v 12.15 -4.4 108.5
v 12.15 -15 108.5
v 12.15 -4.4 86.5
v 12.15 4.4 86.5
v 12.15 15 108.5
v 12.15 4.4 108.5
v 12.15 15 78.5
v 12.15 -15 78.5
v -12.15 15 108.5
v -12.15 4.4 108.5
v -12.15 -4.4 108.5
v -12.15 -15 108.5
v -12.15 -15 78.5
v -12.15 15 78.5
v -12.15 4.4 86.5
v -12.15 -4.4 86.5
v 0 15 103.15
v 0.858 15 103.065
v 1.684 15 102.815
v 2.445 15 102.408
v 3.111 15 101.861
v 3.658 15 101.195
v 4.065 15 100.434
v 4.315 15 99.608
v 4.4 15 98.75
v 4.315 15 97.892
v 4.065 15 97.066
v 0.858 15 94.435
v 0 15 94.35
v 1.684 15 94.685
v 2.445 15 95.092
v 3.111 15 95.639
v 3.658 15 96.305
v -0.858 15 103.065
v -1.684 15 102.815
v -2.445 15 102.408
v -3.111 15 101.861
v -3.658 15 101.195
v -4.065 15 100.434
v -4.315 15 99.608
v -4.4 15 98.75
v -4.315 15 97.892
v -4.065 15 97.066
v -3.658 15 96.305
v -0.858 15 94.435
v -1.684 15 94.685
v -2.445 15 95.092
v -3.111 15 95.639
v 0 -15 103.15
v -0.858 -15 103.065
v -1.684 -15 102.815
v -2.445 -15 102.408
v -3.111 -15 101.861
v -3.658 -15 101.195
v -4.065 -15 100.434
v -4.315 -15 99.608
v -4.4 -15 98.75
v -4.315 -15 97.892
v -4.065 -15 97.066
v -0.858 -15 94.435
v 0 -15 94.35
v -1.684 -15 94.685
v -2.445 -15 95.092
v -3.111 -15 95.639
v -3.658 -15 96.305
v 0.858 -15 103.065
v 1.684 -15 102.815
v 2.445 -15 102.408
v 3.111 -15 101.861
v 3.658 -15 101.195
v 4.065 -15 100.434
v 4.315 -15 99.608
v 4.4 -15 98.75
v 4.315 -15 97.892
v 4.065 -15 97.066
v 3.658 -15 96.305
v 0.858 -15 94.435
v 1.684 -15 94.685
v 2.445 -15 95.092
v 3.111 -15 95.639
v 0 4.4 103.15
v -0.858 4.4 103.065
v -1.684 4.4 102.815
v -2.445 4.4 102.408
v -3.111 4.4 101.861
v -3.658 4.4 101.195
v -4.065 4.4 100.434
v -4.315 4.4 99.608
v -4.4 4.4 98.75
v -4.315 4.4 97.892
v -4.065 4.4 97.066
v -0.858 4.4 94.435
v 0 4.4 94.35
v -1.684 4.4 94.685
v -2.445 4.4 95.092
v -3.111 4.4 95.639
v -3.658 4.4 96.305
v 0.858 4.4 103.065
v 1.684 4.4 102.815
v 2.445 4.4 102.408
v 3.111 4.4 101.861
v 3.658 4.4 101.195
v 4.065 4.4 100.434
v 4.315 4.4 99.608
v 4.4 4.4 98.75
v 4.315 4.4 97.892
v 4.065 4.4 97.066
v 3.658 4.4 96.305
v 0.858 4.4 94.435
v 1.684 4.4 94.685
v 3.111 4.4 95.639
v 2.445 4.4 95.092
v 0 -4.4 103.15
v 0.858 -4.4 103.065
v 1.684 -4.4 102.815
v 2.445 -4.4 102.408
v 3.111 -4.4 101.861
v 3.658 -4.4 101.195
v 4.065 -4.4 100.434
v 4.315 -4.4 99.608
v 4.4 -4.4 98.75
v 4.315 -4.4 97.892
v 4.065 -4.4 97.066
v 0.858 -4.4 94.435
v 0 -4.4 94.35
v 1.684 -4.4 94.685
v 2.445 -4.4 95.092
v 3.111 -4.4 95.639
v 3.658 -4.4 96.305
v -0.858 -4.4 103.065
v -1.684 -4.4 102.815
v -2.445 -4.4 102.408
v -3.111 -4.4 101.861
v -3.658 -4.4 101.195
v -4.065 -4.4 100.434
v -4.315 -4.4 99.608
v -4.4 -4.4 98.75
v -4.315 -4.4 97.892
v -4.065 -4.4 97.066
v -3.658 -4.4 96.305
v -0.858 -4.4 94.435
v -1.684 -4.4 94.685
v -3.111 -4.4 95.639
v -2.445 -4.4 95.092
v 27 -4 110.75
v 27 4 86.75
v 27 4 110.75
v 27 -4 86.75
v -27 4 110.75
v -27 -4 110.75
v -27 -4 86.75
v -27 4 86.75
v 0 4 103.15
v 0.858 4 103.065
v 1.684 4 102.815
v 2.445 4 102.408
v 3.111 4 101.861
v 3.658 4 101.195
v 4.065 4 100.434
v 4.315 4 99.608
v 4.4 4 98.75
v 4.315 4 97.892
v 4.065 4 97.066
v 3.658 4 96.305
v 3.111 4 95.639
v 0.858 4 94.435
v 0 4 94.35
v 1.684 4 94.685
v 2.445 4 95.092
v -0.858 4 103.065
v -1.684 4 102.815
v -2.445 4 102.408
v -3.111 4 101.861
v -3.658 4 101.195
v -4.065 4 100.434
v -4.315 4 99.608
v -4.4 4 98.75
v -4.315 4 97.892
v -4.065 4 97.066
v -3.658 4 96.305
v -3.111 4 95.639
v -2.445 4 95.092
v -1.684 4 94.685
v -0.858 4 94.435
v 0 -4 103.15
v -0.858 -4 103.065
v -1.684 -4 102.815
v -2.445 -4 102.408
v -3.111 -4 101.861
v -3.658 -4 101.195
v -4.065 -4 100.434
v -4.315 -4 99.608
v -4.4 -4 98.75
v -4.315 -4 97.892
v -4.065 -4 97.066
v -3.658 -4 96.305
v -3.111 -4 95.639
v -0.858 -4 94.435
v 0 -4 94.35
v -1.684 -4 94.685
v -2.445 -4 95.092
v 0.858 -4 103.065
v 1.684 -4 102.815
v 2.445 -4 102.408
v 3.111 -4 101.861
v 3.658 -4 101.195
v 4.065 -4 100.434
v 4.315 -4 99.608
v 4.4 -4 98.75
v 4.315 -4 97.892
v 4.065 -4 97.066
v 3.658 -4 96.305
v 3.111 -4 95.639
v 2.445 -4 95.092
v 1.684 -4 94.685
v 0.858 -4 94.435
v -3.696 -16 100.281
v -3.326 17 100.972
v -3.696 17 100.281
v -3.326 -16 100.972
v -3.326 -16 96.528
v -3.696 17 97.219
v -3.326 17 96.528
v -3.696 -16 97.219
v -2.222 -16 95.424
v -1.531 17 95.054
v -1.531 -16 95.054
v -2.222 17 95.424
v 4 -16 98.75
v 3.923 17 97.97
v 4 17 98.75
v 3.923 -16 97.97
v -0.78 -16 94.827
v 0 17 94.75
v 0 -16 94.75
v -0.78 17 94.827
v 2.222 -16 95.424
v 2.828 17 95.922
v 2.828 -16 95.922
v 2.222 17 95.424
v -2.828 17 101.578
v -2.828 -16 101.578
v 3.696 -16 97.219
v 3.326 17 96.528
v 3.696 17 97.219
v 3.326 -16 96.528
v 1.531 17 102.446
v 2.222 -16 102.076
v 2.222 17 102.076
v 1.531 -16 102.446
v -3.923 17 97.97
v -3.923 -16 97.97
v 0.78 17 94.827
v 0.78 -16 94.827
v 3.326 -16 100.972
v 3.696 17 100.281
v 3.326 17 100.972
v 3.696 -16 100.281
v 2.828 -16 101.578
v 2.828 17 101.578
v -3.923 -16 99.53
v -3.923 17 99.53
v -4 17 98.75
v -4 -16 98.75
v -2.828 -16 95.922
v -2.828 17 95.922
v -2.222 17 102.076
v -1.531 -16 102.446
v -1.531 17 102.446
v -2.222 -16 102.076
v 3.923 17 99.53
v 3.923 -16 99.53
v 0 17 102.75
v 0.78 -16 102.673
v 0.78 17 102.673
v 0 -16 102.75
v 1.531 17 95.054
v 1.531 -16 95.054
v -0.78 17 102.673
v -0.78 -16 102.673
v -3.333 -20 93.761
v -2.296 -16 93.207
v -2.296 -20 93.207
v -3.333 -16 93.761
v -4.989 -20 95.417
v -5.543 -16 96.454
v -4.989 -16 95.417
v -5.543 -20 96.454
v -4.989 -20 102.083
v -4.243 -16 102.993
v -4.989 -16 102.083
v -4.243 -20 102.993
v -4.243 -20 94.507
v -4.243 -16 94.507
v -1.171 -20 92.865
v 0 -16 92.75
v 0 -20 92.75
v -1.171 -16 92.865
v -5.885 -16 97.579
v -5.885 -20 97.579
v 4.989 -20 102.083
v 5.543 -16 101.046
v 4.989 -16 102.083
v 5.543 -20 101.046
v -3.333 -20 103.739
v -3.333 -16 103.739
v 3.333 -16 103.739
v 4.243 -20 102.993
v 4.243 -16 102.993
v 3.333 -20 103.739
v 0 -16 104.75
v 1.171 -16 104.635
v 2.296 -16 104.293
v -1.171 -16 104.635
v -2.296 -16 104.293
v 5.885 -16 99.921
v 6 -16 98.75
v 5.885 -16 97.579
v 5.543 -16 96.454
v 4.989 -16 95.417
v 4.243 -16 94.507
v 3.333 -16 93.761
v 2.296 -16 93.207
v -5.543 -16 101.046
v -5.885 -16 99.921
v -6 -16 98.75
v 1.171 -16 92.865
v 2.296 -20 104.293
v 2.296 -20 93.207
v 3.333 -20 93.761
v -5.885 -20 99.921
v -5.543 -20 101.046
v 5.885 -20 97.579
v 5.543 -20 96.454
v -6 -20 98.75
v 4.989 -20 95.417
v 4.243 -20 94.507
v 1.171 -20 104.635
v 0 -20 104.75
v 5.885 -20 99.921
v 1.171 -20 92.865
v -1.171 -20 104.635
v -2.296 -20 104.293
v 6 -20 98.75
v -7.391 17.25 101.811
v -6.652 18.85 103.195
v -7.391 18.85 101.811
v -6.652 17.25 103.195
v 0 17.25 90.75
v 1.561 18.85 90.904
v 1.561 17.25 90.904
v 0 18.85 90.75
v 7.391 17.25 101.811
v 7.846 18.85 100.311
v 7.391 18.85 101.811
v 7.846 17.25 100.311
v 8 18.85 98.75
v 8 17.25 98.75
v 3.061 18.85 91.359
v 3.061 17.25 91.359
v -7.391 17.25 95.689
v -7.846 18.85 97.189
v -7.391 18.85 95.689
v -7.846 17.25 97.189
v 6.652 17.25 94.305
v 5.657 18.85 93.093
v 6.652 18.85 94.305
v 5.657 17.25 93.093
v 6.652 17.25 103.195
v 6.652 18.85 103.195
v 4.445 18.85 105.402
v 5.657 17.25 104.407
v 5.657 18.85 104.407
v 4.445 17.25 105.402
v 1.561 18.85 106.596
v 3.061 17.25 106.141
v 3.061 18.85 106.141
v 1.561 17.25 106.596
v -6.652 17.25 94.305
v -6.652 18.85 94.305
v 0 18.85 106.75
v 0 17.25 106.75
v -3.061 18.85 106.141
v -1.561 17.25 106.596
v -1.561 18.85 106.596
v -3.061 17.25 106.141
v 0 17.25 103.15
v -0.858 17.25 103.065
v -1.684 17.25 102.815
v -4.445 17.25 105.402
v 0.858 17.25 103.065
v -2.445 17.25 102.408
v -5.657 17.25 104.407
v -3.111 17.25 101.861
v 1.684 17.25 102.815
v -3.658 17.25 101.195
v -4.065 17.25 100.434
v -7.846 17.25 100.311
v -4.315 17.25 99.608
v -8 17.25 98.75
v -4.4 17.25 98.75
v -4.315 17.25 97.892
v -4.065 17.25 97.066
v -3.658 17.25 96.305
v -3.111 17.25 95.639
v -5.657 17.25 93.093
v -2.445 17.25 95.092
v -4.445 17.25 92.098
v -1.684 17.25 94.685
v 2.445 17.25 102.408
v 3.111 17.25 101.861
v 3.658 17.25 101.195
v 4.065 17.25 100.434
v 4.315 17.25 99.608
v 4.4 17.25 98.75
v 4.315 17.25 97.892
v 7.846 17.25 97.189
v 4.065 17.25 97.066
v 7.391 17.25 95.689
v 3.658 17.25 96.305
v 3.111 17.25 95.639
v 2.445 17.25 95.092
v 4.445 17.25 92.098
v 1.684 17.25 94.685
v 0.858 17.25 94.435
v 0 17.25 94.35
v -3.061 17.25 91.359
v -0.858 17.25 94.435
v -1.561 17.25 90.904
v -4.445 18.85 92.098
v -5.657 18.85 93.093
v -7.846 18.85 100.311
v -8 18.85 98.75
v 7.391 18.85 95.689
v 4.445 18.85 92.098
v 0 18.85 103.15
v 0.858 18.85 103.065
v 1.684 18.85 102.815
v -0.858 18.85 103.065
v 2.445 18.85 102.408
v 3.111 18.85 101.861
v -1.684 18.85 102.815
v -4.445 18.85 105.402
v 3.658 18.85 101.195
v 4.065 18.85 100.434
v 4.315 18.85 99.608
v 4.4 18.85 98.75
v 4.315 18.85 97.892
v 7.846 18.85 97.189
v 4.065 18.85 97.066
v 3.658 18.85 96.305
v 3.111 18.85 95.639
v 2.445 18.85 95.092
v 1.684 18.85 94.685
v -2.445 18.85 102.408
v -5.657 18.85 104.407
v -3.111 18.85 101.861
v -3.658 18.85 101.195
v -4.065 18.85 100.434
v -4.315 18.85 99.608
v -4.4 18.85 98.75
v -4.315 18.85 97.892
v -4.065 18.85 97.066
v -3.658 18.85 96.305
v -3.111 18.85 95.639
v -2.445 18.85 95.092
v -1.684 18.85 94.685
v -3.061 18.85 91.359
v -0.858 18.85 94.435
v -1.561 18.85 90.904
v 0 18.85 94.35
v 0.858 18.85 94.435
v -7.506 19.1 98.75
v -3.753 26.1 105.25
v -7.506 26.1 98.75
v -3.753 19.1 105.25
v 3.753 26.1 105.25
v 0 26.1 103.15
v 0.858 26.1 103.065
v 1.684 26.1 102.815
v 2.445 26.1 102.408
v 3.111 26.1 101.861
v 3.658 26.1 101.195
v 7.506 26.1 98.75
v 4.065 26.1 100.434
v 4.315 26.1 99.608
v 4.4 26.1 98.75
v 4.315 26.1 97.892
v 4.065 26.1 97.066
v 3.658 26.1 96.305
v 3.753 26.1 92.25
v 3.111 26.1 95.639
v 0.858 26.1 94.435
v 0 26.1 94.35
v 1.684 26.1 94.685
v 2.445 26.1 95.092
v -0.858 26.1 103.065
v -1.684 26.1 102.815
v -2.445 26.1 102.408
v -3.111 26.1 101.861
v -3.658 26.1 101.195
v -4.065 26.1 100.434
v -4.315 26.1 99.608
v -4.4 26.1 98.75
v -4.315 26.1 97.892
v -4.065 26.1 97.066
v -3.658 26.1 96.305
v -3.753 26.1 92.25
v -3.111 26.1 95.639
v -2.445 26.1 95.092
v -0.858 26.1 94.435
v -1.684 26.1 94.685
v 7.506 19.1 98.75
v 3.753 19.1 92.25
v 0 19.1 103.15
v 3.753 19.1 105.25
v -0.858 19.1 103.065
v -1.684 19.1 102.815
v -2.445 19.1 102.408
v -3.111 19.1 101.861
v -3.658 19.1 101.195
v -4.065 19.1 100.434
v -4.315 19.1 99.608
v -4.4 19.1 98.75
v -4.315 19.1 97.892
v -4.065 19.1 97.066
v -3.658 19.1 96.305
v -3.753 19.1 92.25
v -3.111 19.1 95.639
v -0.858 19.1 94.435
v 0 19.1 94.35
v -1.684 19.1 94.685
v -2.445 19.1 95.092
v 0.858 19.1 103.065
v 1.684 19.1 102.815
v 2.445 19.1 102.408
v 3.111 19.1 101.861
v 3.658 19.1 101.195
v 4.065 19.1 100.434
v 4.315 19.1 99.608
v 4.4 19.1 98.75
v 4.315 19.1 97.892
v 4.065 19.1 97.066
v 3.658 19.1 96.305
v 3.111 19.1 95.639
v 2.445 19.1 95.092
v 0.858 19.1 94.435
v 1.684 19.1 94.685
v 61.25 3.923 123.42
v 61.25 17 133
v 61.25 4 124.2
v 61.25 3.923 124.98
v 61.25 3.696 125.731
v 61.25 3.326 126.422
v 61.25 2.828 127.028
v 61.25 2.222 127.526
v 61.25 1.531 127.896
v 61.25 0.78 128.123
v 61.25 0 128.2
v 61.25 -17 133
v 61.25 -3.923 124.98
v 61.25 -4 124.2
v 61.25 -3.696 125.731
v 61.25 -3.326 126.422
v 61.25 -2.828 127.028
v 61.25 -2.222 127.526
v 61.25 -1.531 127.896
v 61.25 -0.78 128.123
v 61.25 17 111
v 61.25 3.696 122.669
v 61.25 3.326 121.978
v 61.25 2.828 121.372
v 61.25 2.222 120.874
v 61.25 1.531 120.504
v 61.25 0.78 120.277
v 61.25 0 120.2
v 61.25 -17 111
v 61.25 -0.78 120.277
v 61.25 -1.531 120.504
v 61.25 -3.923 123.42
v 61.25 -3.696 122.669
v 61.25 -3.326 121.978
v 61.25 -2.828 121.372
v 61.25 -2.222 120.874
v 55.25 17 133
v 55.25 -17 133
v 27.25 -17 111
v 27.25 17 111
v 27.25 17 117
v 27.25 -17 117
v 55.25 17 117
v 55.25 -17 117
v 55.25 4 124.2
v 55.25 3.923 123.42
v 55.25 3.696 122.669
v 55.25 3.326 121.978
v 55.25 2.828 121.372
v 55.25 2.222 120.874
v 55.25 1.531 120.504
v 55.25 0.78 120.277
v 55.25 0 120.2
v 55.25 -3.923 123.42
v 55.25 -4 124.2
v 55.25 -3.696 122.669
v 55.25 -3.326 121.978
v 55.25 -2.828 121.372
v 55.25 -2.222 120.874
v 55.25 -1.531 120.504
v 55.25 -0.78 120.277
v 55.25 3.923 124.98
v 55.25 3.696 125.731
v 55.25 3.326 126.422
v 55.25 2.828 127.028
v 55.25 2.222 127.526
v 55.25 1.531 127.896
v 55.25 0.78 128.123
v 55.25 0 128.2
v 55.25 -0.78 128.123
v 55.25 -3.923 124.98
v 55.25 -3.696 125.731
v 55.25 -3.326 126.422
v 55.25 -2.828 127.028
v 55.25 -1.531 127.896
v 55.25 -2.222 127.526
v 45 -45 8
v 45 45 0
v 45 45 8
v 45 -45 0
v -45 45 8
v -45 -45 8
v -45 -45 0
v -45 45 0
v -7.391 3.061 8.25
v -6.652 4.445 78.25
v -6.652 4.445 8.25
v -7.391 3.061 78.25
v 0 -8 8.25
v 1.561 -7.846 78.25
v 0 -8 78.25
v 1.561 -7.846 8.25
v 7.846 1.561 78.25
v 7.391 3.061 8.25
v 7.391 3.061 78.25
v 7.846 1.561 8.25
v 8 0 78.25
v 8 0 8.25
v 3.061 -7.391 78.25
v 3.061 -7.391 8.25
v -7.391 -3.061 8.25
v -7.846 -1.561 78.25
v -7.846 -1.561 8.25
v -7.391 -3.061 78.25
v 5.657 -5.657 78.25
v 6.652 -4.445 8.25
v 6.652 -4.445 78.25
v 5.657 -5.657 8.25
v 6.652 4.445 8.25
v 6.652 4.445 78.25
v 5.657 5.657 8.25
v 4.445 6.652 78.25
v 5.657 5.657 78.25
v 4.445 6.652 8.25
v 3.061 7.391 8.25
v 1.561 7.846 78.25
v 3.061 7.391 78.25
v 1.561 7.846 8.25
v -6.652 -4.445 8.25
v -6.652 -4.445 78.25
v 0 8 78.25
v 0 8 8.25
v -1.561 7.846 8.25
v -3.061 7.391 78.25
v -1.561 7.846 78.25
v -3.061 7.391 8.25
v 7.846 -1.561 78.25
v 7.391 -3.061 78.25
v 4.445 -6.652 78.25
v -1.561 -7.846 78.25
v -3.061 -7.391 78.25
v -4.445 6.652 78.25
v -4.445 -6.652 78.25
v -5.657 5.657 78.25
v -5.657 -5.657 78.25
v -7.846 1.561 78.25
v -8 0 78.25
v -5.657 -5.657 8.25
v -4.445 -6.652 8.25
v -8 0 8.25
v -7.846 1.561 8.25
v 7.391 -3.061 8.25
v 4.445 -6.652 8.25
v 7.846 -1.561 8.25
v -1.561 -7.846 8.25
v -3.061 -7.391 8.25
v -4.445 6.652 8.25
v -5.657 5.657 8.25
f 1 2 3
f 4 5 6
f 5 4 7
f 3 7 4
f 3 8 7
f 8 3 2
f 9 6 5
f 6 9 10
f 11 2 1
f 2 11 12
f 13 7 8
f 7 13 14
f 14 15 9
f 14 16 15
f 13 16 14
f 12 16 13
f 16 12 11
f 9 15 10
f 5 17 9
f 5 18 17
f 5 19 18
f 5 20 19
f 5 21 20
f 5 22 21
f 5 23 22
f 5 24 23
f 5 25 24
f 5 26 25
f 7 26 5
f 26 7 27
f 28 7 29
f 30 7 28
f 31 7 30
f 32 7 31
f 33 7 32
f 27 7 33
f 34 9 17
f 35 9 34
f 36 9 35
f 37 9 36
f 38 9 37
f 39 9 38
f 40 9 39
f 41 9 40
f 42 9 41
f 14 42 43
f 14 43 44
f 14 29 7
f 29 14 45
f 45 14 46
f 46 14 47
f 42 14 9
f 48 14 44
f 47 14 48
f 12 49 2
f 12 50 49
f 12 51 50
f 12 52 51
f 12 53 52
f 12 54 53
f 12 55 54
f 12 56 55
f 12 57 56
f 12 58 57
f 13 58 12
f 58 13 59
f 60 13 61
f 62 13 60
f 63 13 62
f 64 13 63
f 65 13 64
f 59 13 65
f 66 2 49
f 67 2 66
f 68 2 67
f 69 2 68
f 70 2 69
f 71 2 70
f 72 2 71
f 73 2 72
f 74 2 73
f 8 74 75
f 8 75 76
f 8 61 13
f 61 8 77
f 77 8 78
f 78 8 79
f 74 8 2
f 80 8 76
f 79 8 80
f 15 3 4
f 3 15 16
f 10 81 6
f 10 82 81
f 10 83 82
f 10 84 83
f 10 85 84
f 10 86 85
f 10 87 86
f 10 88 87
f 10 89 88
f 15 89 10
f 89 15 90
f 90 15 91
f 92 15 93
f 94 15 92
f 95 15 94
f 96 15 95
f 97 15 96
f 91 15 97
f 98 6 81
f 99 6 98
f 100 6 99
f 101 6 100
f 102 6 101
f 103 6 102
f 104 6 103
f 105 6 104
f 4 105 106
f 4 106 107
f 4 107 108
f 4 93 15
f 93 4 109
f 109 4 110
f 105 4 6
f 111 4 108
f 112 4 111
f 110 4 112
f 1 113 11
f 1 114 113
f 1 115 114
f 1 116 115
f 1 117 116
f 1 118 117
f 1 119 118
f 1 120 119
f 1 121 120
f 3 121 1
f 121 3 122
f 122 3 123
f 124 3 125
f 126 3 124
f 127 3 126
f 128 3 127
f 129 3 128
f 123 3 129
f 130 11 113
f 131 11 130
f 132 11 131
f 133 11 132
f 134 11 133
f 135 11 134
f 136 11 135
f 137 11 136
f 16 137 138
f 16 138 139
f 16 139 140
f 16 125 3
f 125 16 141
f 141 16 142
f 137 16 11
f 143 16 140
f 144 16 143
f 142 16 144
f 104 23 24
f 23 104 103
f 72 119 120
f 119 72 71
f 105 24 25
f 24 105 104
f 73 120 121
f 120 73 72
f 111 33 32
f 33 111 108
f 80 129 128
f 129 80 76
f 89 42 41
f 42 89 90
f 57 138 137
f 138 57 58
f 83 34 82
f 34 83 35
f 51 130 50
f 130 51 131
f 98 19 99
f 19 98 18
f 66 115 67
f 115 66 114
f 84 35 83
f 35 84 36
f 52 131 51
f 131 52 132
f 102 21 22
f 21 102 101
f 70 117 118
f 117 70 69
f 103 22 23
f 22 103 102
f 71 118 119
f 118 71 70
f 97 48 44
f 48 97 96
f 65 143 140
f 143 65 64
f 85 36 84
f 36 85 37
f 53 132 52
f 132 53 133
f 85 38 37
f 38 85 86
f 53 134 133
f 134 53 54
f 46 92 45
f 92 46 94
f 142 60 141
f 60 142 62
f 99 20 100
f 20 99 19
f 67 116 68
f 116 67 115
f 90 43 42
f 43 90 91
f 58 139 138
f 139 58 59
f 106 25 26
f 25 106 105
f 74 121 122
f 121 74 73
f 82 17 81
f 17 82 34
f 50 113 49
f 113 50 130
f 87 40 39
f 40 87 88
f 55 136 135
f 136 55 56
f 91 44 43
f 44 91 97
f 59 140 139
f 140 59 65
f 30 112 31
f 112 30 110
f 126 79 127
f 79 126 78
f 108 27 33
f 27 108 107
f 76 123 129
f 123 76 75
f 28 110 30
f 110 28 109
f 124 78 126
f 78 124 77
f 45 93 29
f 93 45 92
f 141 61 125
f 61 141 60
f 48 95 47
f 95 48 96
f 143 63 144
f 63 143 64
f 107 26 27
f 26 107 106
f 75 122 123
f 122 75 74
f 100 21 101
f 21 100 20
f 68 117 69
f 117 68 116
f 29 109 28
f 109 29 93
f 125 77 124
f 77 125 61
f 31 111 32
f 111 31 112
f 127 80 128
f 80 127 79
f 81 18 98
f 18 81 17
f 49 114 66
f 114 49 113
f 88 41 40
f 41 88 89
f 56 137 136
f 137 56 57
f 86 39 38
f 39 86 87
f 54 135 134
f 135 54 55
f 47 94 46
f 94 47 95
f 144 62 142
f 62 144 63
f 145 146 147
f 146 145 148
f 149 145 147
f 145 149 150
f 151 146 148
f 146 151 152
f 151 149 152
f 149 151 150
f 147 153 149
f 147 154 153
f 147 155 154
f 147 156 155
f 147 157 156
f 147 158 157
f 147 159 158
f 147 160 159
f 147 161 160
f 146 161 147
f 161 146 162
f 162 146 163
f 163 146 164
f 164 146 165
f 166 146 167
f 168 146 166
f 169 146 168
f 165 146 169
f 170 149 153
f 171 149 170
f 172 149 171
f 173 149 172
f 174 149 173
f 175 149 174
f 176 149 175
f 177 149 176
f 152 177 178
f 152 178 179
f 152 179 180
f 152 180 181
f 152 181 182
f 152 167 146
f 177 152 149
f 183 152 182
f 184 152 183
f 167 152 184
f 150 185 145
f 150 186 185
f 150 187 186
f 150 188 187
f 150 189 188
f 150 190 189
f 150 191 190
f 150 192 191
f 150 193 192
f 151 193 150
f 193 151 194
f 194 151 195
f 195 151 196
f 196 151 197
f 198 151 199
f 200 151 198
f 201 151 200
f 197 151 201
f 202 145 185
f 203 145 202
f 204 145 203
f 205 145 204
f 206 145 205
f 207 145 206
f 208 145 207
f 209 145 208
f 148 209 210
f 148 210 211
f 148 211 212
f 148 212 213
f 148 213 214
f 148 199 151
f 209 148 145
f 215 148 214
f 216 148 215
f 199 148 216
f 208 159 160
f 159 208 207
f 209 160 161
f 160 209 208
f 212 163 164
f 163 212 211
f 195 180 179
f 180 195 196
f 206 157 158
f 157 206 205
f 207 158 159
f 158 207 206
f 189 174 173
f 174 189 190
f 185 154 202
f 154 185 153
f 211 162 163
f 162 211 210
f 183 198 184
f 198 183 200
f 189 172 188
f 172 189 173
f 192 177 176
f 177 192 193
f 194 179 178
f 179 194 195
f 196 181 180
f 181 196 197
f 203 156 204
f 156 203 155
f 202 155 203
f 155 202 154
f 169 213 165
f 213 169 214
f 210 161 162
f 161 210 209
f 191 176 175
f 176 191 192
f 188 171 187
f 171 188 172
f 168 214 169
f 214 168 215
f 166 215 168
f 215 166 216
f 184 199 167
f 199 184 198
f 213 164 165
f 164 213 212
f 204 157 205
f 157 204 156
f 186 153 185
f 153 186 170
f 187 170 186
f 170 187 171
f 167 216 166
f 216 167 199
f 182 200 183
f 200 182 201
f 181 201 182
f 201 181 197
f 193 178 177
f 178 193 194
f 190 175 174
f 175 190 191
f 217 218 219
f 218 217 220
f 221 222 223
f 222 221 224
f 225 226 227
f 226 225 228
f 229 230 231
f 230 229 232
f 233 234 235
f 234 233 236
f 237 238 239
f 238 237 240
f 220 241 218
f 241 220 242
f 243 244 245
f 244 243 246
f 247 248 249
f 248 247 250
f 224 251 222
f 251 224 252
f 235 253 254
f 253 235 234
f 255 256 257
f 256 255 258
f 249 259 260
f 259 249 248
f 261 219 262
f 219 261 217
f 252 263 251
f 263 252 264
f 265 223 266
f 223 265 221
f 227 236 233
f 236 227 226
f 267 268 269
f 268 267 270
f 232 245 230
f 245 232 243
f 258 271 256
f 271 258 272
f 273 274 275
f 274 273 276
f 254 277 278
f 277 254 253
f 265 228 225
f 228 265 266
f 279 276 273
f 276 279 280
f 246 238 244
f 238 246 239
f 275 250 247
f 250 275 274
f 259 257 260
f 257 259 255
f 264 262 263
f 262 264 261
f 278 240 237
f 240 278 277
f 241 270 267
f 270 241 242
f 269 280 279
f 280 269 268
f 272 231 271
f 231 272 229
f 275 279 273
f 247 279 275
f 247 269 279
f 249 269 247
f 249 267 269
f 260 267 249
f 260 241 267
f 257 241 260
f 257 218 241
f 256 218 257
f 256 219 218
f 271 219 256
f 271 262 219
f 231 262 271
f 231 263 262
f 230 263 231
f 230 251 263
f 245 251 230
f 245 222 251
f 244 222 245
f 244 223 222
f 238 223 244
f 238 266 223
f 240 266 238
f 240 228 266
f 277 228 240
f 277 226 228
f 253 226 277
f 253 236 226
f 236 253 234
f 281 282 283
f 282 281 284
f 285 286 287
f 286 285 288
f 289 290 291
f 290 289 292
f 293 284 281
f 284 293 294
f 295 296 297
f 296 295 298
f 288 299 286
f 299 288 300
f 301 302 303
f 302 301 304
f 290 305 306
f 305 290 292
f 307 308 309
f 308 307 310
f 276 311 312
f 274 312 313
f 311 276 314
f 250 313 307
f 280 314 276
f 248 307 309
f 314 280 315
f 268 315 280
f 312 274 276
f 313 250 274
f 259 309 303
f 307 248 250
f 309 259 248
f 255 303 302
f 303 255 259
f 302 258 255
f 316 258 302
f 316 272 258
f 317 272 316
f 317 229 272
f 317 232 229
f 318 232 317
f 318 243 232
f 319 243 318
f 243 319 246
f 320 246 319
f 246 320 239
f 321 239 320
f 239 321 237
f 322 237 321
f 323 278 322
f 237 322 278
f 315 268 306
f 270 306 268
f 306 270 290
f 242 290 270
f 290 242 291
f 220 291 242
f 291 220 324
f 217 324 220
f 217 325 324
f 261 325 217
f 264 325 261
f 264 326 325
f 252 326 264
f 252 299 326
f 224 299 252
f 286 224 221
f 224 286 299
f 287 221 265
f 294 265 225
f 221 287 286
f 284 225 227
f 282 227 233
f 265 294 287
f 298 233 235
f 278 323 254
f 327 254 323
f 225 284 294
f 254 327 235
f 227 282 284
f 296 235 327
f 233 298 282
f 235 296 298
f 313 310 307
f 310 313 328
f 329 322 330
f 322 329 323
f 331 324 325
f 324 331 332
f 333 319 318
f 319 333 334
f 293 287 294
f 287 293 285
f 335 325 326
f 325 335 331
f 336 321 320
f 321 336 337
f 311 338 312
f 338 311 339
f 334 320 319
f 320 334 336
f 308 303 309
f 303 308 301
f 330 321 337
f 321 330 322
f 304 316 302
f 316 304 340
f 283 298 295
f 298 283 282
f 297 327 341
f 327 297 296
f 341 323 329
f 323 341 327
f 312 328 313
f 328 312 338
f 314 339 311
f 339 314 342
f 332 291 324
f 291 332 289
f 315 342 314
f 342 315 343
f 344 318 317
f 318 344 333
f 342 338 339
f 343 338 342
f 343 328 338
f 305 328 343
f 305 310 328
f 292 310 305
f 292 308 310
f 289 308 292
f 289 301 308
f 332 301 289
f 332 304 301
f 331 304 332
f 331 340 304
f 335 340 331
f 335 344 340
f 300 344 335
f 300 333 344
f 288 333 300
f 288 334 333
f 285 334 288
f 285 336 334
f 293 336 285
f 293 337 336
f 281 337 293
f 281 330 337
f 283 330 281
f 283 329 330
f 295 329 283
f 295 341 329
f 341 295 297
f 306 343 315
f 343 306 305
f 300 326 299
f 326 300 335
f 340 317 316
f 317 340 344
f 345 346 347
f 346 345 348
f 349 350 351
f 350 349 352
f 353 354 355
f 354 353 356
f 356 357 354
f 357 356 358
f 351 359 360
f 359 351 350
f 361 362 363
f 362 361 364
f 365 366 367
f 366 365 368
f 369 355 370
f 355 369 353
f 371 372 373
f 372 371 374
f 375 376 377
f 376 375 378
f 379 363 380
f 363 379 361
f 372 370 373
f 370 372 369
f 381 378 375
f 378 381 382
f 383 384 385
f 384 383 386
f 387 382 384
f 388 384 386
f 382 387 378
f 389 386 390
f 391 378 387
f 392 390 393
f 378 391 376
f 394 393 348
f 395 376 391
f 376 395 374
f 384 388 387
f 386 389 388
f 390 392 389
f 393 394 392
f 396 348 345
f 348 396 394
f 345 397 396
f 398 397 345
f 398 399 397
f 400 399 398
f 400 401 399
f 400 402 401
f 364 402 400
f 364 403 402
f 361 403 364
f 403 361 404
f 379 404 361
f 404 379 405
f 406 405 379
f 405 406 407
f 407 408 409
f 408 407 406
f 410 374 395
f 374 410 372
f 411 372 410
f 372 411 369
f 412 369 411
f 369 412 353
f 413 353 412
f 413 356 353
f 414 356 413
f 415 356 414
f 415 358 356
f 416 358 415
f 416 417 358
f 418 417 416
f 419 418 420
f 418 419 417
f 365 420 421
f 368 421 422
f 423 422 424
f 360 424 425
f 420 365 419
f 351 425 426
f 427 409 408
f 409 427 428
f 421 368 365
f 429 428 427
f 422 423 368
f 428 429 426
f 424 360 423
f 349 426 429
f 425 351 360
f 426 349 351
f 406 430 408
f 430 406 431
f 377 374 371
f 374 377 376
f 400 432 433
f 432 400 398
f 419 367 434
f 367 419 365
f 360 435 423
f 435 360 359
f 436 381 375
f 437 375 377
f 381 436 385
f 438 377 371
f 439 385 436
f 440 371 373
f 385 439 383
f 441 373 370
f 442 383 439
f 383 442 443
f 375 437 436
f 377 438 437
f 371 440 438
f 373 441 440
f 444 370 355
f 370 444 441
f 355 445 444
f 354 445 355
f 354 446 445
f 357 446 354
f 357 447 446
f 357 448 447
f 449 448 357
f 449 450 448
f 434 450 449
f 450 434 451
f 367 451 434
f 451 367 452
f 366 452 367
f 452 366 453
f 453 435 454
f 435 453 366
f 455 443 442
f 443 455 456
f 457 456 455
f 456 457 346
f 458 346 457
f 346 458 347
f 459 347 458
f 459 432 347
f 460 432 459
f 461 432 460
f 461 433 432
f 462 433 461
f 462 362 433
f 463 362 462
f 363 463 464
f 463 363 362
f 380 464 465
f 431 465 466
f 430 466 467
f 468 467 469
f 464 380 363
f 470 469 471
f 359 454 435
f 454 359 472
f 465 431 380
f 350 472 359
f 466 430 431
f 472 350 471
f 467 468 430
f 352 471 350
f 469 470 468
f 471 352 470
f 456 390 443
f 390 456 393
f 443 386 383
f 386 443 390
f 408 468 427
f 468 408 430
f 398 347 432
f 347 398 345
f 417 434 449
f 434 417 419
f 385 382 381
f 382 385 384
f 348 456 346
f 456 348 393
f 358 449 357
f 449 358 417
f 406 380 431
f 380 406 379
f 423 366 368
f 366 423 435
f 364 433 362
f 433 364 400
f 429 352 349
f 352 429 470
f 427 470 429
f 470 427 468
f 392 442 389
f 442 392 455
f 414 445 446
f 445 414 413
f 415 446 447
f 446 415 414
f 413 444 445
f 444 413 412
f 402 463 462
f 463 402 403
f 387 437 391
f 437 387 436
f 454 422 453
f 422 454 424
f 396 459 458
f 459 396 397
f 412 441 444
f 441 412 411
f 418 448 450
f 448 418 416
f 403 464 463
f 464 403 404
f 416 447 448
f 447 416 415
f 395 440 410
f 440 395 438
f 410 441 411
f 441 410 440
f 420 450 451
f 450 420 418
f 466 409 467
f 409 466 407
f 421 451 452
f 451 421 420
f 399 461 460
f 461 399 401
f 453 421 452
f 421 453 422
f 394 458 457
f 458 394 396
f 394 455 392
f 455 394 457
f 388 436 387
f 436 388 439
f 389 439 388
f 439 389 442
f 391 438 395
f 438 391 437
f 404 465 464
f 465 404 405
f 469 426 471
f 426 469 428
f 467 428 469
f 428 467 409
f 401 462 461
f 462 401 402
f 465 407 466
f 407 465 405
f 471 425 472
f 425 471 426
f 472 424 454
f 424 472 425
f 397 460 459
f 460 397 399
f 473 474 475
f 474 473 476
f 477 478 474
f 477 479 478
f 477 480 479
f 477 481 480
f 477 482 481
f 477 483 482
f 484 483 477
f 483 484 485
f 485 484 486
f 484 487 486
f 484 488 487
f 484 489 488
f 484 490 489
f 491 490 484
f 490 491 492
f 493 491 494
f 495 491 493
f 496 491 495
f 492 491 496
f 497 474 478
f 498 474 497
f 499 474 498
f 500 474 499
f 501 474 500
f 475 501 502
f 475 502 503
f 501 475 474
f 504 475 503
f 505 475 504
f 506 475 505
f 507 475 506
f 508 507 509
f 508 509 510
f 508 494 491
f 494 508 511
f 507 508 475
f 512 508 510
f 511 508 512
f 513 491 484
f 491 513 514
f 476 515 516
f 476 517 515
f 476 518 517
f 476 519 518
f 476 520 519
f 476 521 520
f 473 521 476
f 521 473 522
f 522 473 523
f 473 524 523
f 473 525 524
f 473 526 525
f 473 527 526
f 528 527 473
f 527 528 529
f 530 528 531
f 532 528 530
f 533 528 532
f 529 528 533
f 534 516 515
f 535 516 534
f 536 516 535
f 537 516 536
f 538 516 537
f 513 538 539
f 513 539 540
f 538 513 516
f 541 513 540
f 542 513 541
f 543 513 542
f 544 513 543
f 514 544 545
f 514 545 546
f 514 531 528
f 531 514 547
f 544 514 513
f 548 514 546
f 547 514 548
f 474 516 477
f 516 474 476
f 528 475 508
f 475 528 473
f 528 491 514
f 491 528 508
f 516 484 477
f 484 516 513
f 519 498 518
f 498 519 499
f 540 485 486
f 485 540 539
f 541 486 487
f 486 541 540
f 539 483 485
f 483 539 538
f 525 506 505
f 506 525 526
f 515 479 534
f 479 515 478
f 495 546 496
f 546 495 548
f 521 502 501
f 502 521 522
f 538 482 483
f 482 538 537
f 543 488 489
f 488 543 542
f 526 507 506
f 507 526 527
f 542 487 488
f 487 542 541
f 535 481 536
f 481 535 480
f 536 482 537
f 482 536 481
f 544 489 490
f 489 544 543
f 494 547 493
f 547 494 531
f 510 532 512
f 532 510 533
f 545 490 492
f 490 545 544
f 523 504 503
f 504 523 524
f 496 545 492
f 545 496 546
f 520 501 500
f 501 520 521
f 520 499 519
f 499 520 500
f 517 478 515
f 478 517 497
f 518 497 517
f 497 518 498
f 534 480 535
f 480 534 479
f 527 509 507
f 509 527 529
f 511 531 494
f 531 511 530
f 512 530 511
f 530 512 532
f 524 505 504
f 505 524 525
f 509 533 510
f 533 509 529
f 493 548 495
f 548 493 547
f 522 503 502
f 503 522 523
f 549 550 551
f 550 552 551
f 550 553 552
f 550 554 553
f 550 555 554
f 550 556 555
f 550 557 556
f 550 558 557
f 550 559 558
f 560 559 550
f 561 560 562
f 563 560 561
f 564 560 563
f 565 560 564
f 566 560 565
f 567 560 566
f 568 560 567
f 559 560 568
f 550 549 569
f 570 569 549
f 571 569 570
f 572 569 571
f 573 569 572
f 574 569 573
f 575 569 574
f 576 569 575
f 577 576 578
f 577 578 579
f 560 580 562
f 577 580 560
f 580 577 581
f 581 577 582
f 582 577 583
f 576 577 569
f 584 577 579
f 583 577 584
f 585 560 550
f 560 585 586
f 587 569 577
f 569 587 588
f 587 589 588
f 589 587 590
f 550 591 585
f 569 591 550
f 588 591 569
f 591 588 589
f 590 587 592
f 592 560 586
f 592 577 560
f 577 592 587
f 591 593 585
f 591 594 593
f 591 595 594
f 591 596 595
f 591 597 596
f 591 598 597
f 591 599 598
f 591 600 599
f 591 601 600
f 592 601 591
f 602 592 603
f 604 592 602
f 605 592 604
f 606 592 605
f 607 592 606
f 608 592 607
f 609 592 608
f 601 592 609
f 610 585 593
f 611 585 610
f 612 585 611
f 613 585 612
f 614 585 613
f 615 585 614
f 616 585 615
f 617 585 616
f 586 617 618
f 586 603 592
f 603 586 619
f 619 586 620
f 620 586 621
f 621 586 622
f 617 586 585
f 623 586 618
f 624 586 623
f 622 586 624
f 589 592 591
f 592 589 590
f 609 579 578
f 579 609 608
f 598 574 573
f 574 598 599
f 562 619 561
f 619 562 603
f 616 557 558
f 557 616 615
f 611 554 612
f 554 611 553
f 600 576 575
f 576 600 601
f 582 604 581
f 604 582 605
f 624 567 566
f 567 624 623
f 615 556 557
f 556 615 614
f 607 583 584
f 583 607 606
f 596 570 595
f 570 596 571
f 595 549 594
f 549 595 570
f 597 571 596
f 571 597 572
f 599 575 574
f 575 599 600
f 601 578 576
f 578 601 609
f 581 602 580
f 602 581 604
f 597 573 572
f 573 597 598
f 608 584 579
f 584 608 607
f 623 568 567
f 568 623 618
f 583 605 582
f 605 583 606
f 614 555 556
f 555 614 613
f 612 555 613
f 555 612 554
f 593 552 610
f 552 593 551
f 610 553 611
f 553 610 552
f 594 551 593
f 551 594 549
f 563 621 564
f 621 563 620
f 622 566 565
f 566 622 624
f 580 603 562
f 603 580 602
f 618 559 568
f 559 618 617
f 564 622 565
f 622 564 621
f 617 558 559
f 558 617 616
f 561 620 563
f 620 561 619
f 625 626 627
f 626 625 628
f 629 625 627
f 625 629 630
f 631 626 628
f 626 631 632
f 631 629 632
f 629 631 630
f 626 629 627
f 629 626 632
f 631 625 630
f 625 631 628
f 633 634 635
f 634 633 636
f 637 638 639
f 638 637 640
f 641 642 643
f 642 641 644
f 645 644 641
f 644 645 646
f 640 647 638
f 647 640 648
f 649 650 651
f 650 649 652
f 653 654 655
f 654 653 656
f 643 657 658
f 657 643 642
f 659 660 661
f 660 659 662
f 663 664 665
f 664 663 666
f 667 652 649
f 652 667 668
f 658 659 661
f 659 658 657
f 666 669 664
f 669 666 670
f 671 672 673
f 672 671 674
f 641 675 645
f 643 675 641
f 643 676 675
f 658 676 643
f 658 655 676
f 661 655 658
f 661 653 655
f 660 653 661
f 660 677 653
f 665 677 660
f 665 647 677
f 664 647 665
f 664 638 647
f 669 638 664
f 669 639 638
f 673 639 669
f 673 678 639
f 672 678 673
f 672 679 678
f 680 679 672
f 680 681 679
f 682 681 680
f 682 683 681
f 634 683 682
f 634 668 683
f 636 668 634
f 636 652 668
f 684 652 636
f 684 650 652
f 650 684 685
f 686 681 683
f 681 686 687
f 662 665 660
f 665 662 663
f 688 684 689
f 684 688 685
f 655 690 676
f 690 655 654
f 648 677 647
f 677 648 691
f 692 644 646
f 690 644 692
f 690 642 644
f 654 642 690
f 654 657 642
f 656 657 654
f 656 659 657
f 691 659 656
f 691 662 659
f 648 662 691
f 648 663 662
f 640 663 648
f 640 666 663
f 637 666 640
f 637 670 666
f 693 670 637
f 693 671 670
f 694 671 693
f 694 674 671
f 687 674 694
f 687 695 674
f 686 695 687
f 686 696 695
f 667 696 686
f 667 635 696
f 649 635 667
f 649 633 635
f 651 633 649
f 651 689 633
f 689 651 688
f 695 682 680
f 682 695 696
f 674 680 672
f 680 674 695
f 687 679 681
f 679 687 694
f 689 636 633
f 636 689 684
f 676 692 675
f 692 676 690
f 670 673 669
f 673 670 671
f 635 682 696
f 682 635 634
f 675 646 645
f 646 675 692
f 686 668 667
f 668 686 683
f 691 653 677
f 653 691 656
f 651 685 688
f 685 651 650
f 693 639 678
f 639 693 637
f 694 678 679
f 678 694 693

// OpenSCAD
$fn = 32;

// ------------------------------------------------------------------------
// Lamp arm: column d16 x 70 mm, arm 54 mm
// Every part is its own module, assembly() places every instance.
// ------------------------------------------------------------------------

// --- part 1 ---
module lamp_base() {
  difference() {
    translate([-45, -45, 0]) cube([90, 90, 8]);
  }
}

// --- part 2 ---
module lamp_column() {
  cylinder(h = 70, d = 16);
}

// --- part 3 ---
module head_fork() {
  difference() {
    translate([-12.15, -15, 0]) cube([24.3, 30, 30]);
    translate([-13.15, -4.4, 8]) cube([26.3, 8.8, 23]);
    translate([0, 0, 20.25]) rotate([90, 0, 0]) cylinder(h = 32, d = 8.8, center = true);
  }
}

// --- part 4 ---
module lamp_arm() {
  difference() {
    translate([-27, -4, 0]) cube([54, 8, 24]);
    translate([0, 0, 12]) rotate([90, 0, 0]) cylinder(h = 10, d = 8.8, center = true);
  }
}

// --- part 5 ---
module arm_pin() {
  rotate([0, 90, 0]) cylinder(h = 34, d = 8, center = true);
  translate([-20, 0, 0]) rotate([0, 90, 0]) cylinder(h = 4, d = 12);
}

// --- part 6 ---
module arm_washer() {
  difference() {
      translate([0, 0, 0]) cylinder(h = 1.6, d = 16);
      translate([0, 0, -1]) cylinder(h = 3.6, d = 8.8);
    }
}

// --- part 7 ---
module arm_nut() {
  difference() {
    linear_extrude(height = 7) polygon(points = [[7.506, 0], [3.753, 6.5], [-3.753, 6.5], [-7.506, 0], [-3.753, -6.5], [3.753, -6.5]]);
    translate([0, 0, -1]) cylinder(h = 9, d = 8.8);
  }
}

// --- part 8 ---
module shade_bracket() {
  difference() {
    translate([-17, -17, 0]) cube([34, 34, 22]);
    translate([-18, -18, 6]) cube([29, 36, 17]);
    translate([14, 0, 13.2]) rotate([0, 90, 0]) cylinder(h = 8, d = 8, center = true);
  }
}

// --- assembly ---
module assembly() {
  color([0.80, 0.24, 0.20]) translate([0, 0, 0]) rotate([0, 0, 0]) lamp_base();
  color([0.20, 0.45, 0.75]) translate([0, 0, 8.25]) rotate([0, 0, 0]) lamp_column();
  color([0.25, 0.62, 0.32]) translate([0, 0, 78.5]) rotate([0, 0, 0]) head_fork();
  color([0.92, 0.70, 0.18]) translate([0, 0, 86.75]) rotate([0, 0, 0]) lamp_arm();
  color([0.58, 0.35, 0.70]) translate([0, 0, 98.75]) rotate([0, 0, 90]) arm_pin();
  color([0.16, 0.66, 0.66]) translate([0, 18.85, 98.75]) rotate([90, 0, 0]) arm_washer();
  color([0.85, 0.48, 0.18]) translate([0, 26.1, 98.75]) rotate([90, 0, 0]) arm_nut();
  color([0.55, 0.60, 0.65]) translate([44.25, 0, 111]) rotate([0, 0, 0]) shade_bracket();
}

assembly();
